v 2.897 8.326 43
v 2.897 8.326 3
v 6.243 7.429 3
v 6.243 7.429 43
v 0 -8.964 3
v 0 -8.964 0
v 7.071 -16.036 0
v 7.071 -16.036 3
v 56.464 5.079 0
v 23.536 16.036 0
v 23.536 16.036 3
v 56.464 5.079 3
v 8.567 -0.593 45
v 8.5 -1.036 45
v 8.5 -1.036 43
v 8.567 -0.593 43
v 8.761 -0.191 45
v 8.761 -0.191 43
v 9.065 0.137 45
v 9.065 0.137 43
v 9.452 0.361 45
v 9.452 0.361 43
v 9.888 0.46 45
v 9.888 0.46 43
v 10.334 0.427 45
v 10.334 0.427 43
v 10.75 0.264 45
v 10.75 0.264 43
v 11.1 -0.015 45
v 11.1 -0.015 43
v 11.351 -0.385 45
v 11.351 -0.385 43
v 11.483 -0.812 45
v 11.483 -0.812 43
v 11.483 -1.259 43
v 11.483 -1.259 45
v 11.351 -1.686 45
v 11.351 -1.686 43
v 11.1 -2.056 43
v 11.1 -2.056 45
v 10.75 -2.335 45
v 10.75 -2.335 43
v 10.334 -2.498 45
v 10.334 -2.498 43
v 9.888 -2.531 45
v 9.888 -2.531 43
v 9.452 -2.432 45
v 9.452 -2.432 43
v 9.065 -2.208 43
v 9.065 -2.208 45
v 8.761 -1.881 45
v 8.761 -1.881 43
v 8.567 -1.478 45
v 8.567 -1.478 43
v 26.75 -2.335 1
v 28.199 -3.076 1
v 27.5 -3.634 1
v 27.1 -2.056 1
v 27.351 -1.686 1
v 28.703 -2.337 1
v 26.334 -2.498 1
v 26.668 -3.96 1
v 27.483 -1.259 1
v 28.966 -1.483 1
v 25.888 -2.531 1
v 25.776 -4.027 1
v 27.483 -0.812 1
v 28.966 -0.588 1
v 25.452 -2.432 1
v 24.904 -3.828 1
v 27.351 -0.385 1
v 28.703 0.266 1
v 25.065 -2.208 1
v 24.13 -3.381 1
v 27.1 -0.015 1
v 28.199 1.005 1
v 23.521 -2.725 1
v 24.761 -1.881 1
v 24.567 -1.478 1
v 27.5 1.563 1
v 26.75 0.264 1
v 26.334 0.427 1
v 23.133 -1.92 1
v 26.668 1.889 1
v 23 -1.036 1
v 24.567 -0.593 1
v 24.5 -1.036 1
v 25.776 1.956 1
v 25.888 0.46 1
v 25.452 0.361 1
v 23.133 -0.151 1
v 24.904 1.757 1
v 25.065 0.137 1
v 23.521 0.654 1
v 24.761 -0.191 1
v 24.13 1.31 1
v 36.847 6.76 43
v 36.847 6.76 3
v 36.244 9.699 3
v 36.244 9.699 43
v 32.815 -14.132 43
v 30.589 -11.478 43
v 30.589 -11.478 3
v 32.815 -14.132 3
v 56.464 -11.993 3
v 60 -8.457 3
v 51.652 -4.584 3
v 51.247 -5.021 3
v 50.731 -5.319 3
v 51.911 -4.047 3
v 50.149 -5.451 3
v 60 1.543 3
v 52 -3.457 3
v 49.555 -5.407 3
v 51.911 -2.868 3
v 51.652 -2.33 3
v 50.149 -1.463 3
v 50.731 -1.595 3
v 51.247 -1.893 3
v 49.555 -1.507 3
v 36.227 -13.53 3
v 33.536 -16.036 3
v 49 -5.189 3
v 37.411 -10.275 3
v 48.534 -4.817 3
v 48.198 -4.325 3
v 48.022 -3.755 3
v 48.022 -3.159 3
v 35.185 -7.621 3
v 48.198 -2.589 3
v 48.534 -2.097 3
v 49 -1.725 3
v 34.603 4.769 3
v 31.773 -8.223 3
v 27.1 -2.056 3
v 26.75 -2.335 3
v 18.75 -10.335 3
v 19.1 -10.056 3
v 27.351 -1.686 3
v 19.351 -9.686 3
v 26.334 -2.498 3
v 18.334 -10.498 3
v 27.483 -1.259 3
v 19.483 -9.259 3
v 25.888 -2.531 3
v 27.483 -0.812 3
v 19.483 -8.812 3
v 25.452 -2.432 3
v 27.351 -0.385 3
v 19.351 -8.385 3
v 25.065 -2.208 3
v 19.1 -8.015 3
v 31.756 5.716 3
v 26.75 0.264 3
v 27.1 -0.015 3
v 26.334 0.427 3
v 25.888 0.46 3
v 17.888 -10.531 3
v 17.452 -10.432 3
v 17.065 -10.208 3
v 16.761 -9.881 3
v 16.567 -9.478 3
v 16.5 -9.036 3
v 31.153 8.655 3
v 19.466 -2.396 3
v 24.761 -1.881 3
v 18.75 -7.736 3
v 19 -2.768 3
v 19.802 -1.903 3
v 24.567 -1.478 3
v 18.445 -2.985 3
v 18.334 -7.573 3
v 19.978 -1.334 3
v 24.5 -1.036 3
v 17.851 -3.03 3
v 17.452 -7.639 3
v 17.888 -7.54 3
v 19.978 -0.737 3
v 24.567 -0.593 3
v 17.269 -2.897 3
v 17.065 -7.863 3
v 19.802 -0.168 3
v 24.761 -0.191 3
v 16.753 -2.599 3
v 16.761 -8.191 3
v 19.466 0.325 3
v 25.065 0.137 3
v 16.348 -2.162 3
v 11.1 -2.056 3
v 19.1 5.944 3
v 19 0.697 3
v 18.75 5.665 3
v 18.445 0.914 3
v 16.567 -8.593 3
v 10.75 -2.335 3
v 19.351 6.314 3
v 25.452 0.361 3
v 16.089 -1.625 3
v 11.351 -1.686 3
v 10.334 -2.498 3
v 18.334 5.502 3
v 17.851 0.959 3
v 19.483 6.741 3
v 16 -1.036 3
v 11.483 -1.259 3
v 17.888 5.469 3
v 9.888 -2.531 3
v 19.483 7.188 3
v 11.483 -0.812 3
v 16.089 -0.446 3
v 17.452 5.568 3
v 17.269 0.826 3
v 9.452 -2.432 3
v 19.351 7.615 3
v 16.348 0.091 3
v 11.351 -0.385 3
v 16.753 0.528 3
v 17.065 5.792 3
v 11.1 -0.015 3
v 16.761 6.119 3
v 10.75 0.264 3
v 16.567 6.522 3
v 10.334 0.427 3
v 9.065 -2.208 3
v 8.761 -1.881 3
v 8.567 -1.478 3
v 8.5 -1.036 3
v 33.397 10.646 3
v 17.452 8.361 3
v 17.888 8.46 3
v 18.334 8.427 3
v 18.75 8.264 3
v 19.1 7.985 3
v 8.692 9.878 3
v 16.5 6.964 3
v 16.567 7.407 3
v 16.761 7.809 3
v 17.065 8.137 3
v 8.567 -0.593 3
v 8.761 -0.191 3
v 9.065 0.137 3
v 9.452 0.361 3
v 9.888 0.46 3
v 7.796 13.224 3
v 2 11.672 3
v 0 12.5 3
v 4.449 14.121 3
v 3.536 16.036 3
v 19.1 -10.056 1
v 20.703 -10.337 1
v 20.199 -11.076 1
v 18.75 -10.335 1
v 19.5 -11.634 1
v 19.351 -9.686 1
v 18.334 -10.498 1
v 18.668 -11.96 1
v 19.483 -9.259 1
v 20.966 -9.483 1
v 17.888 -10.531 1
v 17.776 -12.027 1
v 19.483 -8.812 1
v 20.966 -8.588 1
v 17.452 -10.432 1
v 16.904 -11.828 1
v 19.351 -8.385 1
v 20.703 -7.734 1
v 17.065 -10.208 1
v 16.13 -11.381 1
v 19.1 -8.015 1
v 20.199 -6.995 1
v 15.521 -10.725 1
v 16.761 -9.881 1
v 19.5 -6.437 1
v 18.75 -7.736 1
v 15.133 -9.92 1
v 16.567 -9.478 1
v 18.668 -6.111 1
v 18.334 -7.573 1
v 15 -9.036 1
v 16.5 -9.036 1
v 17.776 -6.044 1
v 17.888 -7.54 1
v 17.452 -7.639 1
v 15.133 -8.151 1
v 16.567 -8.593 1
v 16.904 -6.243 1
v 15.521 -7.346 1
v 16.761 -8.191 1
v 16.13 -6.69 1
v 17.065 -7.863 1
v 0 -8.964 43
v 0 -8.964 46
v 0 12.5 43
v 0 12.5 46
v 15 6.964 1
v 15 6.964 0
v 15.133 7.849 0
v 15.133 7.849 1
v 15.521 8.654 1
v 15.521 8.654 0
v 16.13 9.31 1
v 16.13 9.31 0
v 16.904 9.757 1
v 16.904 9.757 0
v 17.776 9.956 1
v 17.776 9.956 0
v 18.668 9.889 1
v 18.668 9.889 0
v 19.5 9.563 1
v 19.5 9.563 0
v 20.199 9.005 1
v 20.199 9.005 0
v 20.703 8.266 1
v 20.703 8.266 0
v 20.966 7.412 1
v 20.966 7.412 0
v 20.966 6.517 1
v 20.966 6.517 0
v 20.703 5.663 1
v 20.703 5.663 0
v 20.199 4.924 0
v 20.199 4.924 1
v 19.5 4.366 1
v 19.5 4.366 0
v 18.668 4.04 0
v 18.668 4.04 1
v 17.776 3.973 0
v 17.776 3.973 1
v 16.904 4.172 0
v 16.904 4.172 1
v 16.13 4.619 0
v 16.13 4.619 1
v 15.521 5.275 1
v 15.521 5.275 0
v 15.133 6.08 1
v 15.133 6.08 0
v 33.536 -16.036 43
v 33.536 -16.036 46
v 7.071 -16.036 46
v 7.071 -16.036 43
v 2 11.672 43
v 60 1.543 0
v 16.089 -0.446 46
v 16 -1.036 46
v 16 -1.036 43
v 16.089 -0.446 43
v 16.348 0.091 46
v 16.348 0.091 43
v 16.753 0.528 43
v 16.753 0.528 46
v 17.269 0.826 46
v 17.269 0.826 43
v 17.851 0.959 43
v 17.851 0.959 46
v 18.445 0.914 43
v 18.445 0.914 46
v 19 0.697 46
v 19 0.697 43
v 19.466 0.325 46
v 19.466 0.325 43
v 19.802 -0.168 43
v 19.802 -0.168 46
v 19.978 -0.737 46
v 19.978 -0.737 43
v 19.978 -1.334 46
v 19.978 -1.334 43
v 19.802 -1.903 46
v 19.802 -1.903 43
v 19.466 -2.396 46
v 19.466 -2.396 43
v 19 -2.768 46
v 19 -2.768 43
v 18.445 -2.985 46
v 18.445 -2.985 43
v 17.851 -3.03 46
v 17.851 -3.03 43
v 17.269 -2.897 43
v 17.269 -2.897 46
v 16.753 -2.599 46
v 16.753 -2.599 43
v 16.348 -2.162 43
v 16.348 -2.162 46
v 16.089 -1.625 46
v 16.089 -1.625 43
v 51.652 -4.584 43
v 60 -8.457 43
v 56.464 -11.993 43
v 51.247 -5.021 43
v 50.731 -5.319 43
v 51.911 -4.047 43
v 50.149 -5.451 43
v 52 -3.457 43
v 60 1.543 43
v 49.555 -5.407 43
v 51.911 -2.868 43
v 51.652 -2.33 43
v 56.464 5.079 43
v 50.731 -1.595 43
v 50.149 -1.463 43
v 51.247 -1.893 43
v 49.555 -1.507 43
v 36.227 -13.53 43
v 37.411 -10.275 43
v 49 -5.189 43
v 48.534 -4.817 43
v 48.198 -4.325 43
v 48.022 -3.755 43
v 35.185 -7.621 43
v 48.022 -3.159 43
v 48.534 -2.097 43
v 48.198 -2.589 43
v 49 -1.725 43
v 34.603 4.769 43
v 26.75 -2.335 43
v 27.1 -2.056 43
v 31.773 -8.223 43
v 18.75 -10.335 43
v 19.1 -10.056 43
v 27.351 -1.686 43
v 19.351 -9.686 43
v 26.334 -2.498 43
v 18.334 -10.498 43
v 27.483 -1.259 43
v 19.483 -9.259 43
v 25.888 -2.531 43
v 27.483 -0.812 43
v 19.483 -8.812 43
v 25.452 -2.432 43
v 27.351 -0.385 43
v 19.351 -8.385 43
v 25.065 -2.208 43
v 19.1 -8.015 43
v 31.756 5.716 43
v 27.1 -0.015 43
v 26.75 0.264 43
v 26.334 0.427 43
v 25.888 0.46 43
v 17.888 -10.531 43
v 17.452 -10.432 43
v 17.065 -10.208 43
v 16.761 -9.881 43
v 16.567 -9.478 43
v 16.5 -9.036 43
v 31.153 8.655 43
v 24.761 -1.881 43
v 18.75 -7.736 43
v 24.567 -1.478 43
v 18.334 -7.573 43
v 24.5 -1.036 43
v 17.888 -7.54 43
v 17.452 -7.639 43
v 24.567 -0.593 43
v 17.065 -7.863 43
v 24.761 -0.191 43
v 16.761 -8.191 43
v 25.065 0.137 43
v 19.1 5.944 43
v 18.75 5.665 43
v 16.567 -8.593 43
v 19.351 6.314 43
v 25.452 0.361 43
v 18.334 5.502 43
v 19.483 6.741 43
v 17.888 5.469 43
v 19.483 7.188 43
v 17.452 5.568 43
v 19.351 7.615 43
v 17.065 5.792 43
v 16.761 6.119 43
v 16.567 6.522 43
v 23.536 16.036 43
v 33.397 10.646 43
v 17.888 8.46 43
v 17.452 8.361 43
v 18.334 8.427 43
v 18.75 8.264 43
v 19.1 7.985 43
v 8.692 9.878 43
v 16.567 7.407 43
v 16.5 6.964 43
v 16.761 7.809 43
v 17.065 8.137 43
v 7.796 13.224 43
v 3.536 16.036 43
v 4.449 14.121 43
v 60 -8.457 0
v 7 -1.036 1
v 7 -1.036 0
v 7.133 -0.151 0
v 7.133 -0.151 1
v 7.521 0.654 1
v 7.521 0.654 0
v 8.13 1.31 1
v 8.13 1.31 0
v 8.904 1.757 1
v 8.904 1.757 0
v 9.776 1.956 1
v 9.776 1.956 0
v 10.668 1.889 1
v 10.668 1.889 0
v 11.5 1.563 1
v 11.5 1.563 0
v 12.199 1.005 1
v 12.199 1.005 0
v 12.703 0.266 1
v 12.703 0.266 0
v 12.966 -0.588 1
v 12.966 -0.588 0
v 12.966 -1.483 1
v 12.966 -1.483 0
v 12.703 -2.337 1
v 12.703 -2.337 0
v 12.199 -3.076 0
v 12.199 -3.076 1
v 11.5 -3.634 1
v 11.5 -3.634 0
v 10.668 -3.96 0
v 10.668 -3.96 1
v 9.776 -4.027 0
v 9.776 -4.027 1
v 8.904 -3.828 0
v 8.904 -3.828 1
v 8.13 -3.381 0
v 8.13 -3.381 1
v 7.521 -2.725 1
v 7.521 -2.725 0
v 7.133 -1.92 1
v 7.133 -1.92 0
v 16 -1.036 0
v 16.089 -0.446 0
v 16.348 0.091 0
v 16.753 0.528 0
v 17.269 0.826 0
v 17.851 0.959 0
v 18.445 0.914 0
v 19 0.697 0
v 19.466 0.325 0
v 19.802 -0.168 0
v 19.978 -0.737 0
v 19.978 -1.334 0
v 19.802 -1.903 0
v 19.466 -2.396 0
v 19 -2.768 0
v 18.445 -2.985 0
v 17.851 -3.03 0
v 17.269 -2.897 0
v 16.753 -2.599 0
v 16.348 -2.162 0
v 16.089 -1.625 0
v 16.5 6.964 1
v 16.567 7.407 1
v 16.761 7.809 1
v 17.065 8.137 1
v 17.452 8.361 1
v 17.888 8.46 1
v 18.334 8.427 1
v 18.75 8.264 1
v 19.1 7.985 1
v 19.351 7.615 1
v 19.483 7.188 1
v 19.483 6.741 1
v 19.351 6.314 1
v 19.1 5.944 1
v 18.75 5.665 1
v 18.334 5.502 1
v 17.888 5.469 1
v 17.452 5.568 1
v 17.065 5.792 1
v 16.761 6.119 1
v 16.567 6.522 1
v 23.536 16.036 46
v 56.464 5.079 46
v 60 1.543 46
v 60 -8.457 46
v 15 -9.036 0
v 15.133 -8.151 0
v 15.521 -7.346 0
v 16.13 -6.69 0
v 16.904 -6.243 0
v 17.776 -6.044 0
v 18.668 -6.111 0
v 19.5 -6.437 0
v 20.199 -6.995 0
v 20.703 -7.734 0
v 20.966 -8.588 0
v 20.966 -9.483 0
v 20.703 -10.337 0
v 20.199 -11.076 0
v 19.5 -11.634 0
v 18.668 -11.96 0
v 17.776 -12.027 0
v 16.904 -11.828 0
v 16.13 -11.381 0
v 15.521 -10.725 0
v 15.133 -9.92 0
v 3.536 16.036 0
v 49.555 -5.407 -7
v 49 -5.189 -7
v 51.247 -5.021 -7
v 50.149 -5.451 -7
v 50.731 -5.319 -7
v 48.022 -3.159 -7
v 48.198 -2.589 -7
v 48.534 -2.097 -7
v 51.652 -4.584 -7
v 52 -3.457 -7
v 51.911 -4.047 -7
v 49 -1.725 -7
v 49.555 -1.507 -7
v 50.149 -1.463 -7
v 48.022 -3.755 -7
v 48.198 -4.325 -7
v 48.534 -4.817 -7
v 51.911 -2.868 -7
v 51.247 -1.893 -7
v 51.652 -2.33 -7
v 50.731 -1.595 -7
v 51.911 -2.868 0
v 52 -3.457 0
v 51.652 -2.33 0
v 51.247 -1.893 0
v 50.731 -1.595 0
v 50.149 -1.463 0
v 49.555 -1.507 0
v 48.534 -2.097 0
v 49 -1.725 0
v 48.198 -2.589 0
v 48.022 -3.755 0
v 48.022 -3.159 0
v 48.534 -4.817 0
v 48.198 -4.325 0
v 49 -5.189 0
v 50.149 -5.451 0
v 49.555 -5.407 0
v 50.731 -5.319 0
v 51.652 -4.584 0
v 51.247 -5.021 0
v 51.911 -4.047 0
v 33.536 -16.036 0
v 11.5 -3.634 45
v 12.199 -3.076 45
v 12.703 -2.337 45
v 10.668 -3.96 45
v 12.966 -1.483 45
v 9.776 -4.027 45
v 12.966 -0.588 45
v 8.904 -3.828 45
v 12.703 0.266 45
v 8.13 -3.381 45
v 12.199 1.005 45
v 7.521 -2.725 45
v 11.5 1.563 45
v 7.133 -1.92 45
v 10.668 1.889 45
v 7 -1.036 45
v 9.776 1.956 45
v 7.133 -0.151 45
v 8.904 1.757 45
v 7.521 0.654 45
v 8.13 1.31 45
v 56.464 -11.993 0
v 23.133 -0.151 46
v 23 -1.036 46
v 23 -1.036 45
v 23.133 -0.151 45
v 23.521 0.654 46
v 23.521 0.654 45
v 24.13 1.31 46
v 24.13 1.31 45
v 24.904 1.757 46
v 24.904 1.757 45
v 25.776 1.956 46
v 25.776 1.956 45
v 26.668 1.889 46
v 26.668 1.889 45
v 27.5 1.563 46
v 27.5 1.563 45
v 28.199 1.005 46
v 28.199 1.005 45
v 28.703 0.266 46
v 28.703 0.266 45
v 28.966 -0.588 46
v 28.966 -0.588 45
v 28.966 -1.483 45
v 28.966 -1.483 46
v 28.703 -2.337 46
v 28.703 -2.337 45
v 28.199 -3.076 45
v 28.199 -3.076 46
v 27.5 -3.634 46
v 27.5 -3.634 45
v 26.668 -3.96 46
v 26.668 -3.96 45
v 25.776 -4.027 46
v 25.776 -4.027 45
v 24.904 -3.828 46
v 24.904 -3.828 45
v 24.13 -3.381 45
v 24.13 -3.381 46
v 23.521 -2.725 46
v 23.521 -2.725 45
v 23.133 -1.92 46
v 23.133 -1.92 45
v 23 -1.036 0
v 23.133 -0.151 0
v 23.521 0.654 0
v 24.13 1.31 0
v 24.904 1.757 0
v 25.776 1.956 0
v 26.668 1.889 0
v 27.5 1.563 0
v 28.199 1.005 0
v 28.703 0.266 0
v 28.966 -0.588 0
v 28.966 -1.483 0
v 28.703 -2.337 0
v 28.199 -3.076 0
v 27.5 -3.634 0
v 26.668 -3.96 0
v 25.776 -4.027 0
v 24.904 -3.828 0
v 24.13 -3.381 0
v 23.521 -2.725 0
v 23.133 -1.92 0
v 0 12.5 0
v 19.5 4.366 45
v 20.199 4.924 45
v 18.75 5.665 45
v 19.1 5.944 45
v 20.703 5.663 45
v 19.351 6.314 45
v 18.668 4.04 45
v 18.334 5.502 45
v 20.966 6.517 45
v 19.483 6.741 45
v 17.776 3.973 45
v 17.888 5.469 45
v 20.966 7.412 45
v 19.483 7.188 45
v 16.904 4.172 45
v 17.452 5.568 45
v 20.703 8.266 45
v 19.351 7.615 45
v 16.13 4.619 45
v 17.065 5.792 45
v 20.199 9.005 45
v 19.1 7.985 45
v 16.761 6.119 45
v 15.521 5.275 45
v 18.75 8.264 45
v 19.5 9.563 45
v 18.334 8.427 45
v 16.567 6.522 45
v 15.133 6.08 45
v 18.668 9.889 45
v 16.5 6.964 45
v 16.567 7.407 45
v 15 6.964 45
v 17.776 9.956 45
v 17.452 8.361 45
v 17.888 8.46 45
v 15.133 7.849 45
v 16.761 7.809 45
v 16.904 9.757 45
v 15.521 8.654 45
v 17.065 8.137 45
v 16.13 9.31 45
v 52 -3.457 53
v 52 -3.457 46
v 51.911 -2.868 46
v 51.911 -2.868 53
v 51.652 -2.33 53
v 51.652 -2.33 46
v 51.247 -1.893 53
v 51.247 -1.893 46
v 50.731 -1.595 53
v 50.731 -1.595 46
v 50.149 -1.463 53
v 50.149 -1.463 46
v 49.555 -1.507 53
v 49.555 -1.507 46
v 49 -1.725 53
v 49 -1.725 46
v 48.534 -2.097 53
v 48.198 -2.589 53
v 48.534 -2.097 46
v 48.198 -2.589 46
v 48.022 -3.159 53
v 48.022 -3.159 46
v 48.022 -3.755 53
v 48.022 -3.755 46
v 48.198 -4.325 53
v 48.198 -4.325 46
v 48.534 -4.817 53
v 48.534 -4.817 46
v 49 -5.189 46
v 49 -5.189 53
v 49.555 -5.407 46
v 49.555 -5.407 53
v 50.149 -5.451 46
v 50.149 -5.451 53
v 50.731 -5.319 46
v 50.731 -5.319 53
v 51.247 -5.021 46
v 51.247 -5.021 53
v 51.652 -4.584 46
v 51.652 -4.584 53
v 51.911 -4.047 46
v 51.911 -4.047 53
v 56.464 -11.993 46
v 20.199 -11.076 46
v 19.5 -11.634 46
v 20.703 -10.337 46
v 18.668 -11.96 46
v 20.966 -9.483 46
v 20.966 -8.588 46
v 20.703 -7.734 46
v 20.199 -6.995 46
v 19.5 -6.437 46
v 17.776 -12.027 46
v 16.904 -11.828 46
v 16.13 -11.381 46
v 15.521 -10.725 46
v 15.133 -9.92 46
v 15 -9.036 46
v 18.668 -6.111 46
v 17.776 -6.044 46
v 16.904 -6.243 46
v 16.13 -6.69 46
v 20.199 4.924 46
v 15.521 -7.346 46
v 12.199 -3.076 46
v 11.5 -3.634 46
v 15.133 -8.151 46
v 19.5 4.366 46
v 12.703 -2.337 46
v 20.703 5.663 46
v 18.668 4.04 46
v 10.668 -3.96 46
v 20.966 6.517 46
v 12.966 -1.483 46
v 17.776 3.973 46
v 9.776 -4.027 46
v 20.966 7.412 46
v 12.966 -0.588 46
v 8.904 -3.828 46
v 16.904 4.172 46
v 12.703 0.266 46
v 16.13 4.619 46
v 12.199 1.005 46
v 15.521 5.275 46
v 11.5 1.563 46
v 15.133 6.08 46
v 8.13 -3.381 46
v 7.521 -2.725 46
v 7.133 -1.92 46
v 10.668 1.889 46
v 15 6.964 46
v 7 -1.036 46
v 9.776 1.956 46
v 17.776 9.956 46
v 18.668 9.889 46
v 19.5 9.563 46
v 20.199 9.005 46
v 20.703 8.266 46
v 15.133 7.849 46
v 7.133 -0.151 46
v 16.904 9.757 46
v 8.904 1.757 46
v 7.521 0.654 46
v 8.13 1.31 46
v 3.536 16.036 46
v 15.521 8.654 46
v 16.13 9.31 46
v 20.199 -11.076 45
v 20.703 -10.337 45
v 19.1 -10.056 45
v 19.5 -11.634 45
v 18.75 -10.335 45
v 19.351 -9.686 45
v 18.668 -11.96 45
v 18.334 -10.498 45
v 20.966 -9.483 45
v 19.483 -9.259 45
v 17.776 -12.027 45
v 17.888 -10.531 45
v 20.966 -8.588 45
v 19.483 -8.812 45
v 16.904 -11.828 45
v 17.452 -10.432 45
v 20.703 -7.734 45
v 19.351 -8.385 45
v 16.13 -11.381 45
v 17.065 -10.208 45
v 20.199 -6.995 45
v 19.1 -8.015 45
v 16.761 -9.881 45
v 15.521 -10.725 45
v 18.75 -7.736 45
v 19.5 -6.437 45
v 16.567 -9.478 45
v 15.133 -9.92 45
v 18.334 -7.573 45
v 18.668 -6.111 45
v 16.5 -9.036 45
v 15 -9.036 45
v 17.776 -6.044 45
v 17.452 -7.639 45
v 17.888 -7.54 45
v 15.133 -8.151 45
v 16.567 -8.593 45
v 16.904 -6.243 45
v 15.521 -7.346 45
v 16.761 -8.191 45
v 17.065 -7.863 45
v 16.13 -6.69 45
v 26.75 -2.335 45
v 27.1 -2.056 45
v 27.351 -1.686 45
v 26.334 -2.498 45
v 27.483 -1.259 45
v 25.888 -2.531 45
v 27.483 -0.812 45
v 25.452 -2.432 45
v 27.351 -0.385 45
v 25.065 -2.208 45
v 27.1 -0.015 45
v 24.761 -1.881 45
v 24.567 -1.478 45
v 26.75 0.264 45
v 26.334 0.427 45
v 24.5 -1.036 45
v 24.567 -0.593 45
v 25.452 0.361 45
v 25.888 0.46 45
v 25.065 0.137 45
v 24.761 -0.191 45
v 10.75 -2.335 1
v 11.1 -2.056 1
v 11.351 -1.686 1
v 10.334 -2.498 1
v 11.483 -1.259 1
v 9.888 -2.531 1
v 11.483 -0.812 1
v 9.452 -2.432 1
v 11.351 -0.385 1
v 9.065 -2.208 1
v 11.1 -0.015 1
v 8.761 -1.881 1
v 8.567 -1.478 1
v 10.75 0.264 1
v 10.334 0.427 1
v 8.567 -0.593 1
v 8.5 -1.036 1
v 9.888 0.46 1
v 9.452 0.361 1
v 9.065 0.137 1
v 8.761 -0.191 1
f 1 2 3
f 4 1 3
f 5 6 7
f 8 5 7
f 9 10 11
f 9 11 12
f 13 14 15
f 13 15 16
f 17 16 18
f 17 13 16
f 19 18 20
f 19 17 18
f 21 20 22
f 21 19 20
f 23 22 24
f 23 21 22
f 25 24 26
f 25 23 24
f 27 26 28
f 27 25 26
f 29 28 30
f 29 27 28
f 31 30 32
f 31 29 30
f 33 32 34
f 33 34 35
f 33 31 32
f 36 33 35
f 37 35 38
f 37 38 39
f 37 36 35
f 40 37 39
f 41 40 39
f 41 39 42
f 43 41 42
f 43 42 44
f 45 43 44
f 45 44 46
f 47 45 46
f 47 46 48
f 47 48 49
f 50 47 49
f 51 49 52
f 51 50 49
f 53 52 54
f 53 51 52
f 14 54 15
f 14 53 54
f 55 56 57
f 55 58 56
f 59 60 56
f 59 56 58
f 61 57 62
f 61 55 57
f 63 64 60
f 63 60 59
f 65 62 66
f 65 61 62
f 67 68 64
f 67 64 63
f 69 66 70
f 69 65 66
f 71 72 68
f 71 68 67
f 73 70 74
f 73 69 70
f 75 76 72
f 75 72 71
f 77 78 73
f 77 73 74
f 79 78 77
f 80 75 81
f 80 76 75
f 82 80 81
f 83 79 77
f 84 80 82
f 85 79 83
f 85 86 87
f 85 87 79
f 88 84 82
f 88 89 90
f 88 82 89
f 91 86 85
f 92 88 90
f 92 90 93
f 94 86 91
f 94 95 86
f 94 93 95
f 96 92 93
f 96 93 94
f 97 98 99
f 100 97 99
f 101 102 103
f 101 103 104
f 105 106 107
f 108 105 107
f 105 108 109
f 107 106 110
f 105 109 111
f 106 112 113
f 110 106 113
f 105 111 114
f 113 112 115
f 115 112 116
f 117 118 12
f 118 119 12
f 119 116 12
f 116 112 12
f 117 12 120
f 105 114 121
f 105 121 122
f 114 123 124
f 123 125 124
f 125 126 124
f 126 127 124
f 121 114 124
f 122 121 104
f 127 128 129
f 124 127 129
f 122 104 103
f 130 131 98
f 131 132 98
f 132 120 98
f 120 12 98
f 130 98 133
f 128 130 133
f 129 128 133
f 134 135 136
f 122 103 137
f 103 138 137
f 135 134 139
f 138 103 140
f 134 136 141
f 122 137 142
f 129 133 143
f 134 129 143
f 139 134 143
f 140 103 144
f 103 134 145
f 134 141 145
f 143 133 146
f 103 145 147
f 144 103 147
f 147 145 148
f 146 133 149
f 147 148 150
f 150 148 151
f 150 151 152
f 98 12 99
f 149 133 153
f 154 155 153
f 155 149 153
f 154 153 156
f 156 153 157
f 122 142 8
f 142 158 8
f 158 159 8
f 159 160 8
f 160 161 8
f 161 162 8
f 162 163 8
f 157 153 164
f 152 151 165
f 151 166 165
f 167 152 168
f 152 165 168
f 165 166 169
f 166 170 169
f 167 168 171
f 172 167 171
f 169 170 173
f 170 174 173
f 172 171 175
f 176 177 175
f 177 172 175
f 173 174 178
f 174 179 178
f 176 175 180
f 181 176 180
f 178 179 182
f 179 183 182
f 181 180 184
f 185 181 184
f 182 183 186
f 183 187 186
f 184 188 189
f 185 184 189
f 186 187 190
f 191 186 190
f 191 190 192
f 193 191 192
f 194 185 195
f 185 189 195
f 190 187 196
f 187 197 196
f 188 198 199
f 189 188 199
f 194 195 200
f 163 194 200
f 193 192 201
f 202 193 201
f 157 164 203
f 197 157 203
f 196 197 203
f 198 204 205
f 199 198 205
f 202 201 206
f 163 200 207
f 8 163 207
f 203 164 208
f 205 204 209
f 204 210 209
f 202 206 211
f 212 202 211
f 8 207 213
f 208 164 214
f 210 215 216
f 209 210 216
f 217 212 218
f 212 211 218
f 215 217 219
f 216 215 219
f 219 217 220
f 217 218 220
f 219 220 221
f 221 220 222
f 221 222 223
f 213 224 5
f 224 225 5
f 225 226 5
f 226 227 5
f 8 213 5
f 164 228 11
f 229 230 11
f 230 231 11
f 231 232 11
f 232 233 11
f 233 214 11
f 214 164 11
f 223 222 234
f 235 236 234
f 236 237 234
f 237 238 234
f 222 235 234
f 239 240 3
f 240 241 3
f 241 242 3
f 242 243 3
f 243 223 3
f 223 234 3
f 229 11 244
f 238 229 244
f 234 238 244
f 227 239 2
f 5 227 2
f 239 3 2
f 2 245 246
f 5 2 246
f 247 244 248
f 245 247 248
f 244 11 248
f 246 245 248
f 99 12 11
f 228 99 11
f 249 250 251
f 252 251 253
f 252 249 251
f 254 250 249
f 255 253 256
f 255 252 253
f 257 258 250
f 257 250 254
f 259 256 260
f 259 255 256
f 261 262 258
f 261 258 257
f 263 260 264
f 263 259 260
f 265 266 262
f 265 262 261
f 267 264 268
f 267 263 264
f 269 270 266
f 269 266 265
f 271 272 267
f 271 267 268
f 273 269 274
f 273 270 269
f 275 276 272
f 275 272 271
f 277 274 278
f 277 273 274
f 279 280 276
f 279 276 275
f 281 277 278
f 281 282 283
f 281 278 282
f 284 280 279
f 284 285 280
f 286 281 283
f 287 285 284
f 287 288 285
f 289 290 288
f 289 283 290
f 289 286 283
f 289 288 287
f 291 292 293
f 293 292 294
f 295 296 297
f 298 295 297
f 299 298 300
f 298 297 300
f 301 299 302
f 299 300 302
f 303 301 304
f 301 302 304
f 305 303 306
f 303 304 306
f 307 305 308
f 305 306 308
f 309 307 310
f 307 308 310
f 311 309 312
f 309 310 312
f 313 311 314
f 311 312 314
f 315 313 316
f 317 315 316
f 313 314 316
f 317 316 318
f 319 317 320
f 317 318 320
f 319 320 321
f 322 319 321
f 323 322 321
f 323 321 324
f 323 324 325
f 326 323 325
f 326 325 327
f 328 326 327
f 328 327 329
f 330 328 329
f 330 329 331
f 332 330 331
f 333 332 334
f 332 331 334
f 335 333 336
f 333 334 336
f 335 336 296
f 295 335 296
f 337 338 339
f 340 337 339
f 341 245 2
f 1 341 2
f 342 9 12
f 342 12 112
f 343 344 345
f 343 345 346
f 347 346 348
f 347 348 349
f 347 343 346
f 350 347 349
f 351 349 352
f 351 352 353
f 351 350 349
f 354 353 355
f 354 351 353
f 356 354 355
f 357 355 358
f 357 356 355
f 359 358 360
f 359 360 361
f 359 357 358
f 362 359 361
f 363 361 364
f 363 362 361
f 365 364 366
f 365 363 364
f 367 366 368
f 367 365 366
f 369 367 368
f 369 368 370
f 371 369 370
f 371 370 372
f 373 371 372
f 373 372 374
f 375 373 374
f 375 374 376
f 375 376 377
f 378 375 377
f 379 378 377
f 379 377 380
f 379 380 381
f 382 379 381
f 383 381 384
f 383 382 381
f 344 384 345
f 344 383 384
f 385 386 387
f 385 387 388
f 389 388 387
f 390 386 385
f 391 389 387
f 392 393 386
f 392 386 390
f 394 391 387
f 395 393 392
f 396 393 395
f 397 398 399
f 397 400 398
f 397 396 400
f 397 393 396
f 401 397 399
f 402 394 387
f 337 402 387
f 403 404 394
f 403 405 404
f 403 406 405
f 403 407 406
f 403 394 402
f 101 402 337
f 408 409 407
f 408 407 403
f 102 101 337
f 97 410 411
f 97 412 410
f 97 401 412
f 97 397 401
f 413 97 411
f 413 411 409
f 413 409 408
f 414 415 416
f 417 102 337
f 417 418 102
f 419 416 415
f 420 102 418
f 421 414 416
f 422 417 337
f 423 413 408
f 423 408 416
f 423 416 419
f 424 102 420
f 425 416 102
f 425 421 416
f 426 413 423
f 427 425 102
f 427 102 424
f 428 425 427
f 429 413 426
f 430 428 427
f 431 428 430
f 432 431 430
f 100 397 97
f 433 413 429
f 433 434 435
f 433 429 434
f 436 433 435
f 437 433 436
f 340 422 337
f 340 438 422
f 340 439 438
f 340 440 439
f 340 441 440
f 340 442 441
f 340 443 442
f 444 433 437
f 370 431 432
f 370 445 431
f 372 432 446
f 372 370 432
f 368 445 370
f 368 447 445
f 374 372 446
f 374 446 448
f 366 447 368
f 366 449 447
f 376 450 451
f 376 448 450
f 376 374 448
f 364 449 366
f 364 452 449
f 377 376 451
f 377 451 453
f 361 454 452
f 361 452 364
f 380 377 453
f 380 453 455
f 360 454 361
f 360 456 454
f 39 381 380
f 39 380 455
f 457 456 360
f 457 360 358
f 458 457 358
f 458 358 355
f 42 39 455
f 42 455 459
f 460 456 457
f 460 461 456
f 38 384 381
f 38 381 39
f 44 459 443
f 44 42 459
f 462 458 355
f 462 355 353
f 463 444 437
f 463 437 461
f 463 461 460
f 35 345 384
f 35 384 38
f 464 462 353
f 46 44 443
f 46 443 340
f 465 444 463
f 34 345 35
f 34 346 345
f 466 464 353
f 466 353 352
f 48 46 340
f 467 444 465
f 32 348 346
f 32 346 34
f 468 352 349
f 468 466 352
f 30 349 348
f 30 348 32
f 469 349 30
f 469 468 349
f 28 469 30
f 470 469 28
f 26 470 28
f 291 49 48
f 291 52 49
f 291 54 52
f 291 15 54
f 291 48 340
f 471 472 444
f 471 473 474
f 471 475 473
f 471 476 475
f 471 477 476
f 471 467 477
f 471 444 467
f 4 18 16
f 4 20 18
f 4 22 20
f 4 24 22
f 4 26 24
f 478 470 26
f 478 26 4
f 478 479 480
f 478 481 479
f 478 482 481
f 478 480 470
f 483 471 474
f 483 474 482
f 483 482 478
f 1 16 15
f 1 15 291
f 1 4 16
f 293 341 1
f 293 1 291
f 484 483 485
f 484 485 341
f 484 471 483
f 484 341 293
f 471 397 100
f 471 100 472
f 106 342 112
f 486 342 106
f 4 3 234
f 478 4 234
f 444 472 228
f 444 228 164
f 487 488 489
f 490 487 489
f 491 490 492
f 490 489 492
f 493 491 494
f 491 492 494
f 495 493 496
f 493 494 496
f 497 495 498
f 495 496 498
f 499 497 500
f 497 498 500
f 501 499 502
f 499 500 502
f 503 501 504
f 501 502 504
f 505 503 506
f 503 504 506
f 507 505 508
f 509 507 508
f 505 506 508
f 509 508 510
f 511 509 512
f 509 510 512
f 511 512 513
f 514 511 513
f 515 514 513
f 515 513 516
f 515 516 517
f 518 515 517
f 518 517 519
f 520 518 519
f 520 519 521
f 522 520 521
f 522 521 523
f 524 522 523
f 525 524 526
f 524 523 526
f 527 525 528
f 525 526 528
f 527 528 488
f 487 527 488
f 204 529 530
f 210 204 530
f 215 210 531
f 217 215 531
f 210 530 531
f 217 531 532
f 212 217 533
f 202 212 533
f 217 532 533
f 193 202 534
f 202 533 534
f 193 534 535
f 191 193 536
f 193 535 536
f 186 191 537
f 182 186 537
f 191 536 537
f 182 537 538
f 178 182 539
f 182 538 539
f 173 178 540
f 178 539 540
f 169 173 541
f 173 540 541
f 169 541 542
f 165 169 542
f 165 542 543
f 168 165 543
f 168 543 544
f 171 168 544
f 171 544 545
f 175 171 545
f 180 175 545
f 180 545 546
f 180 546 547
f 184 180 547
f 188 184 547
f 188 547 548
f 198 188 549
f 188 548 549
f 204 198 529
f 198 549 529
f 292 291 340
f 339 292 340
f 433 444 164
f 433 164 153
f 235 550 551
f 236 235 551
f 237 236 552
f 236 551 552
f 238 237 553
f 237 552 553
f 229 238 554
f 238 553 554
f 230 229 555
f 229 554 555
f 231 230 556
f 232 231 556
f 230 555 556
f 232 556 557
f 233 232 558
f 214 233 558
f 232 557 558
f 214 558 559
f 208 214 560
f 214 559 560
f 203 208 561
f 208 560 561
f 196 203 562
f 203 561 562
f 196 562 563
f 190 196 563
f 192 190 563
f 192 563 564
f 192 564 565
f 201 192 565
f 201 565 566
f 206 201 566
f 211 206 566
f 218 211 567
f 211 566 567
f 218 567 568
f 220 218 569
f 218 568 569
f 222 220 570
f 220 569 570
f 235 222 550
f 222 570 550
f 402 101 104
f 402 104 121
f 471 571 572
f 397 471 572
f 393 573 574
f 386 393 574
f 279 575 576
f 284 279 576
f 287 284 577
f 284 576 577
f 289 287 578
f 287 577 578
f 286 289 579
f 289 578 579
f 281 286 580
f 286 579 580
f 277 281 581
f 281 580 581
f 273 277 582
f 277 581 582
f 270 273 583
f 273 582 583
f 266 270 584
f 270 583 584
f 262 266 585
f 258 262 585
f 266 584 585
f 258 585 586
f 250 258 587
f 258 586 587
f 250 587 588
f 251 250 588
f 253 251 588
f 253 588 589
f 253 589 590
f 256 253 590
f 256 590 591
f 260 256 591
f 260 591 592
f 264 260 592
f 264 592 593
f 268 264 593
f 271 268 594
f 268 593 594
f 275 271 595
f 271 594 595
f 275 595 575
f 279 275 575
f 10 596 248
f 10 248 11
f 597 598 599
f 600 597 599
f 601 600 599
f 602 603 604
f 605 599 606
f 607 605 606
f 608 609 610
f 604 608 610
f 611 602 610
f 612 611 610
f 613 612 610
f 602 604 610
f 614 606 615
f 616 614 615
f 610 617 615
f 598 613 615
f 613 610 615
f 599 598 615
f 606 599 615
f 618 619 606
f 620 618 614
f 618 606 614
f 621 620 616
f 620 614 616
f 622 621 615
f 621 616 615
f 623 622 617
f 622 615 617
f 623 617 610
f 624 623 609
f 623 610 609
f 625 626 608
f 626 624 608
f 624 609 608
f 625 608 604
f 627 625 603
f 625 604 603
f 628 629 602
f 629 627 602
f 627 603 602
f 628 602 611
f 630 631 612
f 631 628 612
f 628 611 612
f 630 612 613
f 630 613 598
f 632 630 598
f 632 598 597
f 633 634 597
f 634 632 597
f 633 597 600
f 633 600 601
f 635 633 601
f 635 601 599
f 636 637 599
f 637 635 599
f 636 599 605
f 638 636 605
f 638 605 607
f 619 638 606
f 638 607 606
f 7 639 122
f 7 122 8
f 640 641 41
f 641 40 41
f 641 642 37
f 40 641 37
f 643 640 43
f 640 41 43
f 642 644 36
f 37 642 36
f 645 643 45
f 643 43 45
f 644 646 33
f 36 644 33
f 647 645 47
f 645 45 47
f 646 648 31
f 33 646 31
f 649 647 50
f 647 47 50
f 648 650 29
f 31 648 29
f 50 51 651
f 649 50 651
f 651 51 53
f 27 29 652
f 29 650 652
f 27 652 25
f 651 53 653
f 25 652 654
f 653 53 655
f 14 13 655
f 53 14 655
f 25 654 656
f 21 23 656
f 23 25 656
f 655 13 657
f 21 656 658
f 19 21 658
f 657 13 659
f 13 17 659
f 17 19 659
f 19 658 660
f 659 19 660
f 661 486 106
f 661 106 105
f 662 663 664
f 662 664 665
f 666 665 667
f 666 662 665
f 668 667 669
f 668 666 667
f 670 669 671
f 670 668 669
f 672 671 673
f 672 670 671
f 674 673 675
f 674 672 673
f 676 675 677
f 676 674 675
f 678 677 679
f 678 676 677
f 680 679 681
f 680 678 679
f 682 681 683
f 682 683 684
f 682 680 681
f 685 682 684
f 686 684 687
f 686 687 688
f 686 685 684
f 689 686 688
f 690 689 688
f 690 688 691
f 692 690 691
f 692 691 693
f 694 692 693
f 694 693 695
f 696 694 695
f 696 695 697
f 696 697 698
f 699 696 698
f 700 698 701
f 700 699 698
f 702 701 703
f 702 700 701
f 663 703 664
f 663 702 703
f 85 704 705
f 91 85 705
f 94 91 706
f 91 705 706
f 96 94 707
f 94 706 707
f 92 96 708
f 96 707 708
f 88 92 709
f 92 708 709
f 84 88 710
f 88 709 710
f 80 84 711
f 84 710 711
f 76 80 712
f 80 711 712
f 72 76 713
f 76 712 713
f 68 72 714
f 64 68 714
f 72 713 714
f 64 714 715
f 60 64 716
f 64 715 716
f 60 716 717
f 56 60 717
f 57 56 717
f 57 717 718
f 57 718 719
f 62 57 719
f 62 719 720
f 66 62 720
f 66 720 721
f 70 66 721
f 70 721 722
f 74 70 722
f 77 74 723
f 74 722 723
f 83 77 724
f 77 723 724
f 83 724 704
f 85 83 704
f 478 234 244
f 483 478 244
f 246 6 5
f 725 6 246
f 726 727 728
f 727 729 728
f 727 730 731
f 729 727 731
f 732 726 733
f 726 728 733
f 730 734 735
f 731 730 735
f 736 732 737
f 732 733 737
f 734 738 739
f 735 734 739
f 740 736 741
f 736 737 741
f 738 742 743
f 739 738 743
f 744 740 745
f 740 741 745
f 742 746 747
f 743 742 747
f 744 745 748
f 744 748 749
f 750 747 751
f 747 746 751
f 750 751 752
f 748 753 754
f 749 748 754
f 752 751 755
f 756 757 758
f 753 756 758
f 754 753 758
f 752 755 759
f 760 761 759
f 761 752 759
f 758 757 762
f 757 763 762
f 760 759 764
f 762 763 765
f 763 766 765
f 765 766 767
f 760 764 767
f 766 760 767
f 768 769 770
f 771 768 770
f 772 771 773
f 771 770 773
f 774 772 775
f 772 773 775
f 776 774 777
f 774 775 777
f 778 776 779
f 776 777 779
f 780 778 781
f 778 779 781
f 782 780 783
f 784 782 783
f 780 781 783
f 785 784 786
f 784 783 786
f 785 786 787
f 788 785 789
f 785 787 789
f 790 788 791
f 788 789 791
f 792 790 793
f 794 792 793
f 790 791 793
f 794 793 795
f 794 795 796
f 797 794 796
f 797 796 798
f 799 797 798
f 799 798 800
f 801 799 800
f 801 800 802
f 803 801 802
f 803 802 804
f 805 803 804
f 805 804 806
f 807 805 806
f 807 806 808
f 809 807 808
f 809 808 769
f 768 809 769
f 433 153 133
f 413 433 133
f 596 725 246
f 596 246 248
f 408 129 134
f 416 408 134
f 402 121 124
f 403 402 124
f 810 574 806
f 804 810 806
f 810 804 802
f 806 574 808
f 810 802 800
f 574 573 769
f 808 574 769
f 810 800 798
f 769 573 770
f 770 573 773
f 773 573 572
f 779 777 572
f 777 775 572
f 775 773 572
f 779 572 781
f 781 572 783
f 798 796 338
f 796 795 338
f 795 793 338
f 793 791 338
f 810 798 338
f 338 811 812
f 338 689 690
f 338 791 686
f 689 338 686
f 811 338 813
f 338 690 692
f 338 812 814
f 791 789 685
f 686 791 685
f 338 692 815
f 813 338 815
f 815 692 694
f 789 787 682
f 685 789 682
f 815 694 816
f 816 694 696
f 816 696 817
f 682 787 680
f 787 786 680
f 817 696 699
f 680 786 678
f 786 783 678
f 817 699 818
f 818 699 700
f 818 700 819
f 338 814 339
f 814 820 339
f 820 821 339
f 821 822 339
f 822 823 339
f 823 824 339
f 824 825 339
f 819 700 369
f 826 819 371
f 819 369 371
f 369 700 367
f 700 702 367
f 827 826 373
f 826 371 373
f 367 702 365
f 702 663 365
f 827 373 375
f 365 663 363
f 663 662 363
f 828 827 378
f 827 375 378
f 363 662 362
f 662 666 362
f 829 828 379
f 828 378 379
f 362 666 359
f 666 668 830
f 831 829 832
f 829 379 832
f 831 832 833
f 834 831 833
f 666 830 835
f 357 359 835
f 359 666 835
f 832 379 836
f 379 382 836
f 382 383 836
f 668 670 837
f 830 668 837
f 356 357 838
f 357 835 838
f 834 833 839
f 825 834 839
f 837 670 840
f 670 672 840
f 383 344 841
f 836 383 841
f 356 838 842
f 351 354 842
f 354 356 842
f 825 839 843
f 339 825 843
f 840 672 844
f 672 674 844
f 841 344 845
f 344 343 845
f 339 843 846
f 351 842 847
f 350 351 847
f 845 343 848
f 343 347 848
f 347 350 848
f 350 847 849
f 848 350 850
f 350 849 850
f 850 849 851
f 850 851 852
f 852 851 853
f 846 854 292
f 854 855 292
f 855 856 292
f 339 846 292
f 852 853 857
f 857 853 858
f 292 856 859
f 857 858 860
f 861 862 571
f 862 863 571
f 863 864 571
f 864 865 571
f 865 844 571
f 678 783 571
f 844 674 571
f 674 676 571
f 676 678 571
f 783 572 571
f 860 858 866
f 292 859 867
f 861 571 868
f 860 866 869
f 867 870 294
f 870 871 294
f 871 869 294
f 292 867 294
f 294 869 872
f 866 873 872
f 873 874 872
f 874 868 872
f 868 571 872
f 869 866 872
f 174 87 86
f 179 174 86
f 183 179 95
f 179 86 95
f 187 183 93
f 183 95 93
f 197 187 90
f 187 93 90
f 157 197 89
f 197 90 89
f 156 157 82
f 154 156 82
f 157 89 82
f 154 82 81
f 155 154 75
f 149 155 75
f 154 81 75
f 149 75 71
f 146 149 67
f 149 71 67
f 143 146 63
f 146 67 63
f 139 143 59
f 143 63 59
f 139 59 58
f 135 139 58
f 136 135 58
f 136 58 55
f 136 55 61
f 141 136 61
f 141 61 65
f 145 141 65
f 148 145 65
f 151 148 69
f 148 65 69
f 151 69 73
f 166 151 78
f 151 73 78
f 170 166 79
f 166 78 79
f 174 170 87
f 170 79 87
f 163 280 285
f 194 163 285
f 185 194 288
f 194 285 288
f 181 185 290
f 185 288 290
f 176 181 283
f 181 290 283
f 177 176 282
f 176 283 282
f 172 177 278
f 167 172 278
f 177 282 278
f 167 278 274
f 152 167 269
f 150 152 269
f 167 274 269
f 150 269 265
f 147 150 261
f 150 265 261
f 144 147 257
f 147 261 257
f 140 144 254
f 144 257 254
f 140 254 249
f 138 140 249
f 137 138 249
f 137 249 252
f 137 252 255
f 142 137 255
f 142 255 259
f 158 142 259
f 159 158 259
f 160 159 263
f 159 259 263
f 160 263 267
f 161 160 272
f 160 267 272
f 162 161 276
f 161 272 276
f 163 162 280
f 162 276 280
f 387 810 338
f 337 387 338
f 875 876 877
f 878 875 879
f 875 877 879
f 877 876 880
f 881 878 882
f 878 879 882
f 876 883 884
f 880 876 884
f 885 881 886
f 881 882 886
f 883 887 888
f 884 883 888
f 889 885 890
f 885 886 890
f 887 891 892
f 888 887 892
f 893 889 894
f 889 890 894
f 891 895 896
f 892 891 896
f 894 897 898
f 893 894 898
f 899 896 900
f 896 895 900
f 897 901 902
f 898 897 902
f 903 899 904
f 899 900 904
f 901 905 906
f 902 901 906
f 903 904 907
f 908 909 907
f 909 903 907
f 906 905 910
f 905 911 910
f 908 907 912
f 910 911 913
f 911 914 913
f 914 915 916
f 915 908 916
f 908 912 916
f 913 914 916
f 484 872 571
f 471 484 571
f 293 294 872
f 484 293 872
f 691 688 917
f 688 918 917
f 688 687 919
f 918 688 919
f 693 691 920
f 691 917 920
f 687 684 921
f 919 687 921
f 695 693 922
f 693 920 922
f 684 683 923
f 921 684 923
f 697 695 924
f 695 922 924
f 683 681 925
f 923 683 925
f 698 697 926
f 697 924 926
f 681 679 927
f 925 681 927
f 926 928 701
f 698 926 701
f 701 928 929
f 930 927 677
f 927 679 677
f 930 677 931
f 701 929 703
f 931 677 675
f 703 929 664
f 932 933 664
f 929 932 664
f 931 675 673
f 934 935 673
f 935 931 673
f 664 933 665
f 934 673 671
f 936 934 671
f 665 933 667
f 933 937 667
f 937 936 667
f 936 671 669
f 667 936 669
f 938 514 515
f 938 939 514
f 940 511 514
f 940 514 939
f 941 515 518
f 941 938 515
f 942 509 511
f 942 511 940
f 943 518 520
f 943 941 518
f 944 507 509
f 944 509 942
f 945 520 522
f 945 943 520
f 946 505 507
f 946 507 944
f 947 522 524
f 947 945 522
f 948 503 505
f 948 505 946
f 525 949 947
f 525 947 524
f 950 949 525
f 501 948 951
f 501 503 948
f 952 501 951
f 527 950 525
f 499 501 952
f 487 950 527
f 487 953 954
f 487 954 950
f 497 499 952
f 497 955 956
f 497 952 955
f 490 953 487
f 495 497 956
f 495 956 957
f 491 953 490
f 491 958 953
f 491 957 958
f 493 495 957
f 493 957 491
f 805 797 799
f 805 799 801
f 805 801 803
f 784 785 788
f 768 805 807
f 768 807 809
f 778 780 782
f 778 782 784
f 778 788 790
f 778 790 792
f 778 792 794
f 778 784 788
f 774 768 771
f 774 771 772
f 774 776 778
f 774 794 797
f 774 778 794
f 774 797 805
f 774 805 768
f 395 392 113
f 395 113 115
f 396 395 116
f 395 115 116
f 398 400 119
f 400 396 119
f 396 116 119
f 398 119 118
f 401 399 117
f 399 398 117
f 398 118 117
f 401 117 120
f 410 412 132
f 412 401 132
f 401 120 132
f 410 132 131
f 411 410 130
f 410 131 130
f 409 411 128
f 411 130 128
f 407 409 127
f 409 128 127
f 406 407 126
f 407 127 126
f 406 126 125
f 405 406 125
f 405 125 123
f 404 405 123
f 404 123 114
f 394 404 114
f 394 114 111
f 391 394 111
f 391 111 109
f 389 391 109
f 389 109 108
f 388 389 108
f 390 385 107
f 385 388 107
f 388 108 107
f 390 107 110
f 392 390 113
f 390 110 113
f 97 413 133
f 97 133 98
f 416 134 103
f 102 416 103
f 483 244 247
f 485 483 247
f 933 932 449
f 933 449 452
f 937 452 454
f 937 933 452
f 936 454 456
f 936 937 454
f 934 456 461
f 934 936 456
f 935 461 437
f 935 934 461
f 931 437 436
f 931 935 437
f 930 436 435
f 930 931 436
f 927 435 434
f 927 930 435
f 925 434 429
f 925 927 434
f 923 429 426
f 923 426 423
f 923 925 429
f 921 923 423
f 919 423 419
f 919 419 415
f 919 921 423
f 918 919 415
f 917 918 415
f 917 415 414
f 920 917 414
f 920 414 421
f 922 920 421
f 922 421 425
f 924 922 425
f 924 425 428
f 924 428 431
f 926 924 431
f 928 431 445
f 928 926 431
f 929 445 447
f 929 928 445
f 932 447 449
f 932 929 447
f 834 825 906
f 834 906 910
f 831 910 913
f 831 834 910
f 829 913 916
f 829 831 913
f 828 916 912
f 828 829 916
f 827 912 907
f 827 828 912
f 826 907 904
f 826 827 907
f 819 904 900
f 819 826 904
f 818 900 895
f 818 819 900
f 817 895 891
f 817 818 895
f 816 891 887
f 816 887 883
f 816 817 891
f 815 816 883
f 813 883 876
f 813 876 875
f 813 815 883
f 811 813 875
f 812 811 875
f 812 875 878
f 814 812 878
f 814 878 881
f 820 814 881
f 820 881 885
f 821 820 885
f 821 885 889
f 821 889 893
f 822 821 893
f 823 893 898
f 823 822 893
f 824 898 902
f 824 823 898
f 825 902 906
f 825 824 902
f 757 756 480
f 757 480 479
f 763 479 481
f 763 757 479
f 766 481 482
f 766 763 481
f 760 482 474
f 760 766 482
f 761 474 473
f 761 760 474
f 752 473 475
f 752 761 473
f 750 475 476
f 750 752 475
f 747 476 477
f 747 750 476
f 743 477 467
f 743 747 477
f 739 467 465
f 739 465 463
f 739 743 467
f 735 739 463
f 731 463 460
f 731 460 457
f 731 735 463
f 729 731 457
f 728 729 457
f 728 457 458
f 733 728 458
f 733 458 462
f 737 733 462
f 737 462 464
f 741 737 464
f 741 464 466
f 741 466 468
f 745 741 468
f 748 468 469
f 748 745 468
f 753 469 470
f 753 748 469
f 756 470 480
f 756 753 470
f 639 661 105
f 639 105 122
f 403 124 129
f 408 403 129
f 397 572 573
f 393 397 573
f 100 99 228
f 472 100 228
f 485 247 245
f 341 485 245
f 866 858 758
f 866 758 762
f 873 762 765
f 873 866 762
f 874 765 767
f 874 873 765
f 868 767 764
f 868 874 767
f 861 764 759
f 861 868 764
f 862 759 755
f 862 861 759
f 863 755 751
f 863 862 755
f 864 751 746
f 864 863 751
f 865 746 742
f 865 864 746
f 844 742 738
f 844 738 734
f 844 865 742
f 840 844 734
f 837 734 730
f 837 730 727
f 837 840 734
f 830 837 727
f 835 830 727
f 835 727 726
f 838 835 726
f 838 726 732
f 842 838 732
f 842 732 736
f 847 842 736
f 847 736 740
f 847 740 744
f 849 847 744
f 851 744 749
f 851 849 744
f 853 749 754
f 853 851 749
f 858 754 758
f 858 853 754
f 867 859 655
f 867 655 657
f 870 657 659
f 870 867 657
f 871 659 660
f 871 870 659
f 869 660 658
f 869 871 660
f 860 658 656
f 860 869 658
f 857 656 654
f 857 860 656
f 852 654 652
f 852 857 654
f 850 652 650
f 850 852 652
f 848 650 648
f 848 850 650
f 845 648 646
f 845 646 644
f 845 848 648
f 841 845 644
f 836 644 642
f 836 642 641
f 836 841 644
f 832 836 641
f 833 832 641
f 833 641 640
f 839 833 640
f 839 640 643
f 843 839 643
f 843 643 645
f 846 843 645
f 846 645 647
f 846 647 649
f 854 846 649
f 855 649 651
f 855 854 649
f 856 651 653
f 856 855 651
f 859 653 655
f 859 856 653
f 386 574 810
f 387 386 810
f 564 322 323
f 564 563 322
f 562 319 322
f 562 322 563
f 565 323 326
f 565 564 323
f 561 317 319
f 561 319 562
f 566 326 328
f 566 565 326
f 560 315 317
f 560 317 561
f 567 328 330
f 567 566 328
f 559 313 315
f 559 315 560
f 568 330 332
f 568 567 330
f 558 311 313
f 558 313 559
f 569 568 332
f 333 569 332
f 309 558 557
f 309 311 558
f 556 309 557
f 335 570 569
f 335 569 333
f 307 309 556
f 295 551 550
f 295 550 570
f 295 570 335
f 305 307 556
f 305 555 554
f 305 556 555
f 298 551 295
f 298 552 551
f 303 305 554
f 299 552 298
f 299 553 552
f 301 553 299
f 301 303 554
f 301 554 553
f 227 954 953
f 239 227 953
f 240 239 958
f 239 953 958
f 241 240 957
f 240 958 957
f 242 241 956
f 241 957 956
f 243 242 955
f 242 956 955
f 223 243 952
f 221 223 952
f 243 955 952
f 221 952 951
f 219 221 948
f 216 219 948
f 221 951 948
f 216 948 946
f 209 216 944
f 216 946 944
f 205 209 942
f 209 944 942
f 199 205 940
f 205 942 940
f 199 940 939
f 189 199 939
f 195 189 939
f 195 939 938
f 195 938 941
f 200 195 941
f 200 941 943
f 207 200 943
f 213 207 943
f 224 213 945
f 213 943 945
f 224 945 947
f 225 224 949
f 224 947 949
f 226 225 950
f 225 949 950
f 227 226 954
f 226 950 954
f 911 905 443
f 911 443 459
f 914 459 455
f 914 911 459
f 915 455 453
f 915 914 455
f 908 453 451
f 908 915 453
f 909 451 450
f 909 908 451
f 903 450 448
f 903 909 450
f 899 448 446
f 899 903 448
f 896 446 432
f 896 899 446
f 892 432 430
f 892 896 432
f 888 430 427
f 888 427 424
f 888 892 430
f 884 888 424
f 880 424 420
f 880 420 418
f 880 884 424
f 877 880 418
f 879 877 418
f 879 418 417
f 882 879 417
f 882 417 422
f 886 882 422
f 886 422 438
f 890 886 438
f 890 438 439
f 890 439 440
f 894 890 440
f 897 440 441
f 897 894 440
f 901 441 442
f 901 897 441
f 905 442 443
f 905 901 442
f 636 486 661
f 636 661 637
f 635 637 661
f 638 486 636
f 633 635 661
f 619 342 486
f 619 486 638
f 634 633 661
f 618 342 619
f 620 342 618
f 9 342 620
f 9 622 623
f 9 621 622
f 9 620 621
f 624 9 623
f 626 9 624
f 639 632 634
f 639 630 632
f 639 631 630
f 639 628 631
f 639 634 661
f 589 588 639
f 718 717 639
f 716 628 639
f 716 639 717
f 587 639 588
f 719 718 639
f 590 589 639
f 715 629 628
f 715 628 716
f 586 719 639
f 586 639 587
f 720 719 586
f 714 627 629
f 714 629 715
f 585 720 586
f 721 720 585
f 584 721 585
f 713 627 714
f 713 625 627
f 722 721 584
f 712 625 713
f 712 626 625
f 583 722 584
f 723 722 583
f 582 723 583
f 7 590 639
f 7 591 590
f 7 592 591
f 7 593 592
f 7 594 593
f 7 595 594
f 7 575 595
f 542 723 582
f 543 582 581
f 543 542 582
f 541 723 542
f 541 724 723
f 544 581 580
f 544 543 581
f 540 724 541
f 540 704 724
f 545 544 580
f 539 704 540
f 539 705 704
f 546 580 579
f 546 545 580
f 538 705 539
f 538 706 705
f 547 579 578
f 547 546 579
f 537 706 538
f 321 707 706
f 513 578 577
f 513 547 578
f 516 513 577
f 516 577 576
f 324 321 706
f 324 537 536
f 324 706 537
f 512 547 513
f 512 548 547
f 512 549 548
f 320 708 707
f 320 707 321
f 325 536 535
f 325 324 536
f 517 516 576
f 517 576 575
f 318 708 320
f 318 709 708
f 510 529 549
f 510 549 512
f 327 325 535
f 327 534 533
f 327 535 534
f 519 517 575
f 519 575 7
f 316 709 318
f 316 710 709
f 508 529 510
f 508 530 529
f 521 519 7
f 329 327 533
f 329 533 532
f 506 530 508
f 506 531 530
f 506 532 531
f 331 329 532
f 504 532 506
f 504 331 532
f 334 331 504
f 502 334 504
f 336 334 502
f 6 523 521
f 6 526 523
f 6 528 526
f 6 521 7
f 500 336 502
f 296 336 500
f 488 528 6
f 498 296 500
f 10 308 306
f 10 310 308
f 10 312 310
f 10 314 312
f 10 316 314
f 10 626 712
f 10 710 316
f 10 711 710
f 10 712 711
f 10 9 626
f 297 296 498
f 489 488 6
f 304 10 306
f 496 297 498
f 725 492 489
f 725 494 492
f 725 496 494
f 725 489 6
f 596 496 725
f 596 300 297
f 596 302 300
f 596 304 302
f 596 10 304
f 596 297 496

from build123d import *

# Parameters (mm, degrees)
BOSS_EXTRUDE1_DEPTH      = 3
SKETCH4_R                = 2
CUT_EXTRUDE1_DEPTH       = 3
SKETCH5_R                = 3
CUT_EXTRUDE2_DEPTH       = 1
SKETCH6_R                = 1.5
CUT_EXTRUDE3_DEPTH       = 2
BOSS_EXTRUDE2_DEPTH      = 40
BOSS_EXTRUDE3_DEPTH      = 30
BOSS_EXTRUDE3_DEPTH_BACK = 30
SKETCH7_R                = 2
CUT_EXTRUDE5_REACH       = 83.646


with BuildPart() as part:
    # Sketch2 → Boss-Extrude1 (new body)
    with BuildSketch(Plane.XY):
        Polygon((33.535533906, -16.035533906), (3.535533906, -16.035533906), (0, -12.5), (0, 12.5), (3.535533906, 16.035533906), (23.535533906, 16.035533906), (56.464466094, 5.07852329), (60, 1.542989384), (60, -8.457010616), (56.464466094, -11.992544522), align=None)
    boss_extrude1 = extrude(amount=BOSS_EXTRUDE1_DEPTH)

    # Sketch4 → Cut-Extrude1 (cut)
    with BuildSketch(Plane(origin=(0, 0, 0), x_dir=(-1, 0, 0), z_dir=(0, 0, -1))):
        with Locations((-18, -1.035533906)):
            Circle(SKETCH4_R)
    cut_extrude1 = extrude(amount=-CUT_EXTRUDE1_DEPTH, mode=Mode.SUBTRACT)

    # Sketch5 → Cut-Extrude2 (cut)
    with BuildSketch(Plane(origin=(0, 0, 0), x_dir=(-1, 0, 0), z_dir=(0, 0, -1))):
        with Locations((-18, 6.964466094)):
            Circle(SKETCH5_R)
        with Locations((-10, -1.035533906)):
            Circle(SKETCH5_R)
        with Locations((-18, -9.035533906)):
            Circle(SKETCH5_R)
        with Locations((-26, -1.035533906)):
            Circle(SKETCH5_R)
    cut_extrude2 = extrude(amount=-CUT_EXTRUDE2_DEPTH, mode=Mode.SUBTRACT)

    # Sketch6 → Cut-Extrude3 (cut)
    with BuildSketch(Plane(origin=(0, 0, 1), x_dir=(-1, 0, 0), z_dir=(0, 0, -1))):
        with Locations((-18, 6.964466094)):
            Circle(SKETCH6_R)
        with Locations((-26, -1.035533906)):
            Circle(SKETCH6_R)
        with Locations((-10, -1.035533906)):
            Circle(SKETCH6_R)
        with Locations((-18, -9.035533906)):
            Circle(SKETCH6_R)
    cut_extrude3 = extrude(amount=-CUT_EXTRUDE3_DEPTH, mode=Mode.SUBTRACT)

    # Sketch3 → Boss-Extrude2 (add)
    with BuildSketch(Plane.XY.offset(3)):
        Polygon((8.69213043, 9.878421931), (7.795554958, 13.224487146), (4.449489743, 14.121062618), (2, 11.671572875), (2.896575472, 8.32550766), (6.242640687, 7.428932188), align=None)
        Polygon((36.226681597, -13.530158735), (37.411474128, -10.27496801), (35.184792531, -7.621312217), (31.773318403, -8.22284715), (30.588525872, -11.478037875), (32.815207469, -14.131693668), align=None)
        Polygon((36.846550019, 6.760383974), (36.24355834, 9.699159405), (33.397008321, 10.646341008), (31.153449981, 8.65474718), (31.75644166, 5.715971749), (34.602991679, 4.768790146), align=None)
    extrude(amount=BOSS_EXTRUDE2_DEPTH)

    # Mirror1: Boss-Extrude1, Cut-Extrude1, Cut-Extrude2, Cut-Extrude3 across plane
    add(boss_extrude1.mirror(Plane.XY.offset(23)))
    add(cut_extrude1.mirror(Plane.XY.offset(23)), mode=Mode.SUBTRACT)
    add(cut_extrude2.mirror(Plane.XY.offset(23)), mode=Mode.SUBTRACT)
    add(cut_extrude3.mirror(Plane.XY.offset(23)), mode=Mode.SUBTRACT)

    # Sketch7 → Boss-Extrude3 (add, two sides: drawn at the far end of the back side and taken through both)
    with BuildSketch(Plane.XY.offset(23).offset(-BOSS_EXTRUDE3_DEPTH_BACK)):
        with Locations((50, -3.457010616)):
            Circle(SKETCH7_R)
    extrude(amount=BOSS_EXTRUDE3_DEPTH + BOSS_EXTRUDE3_DEPTH_BACK)

    # Cut-Extrude5: up to this face of the body (flat: up to its plane)
    cut_extrude5_end = Plane(part.part.faces().sort_by_distance((18.535533906, -15.35519918, 46))[0])
    # Sketch9 → Cut-Extrude5 (cut, up to the picked face)
    with BuildSketch(Plane(origin=(0, 0, 0), x_dir=(-1, 0, 0), z_dir=(0, 0, -1)), mode=Mode.PRIVATE) as cut_extrude5_sk1:
        Polygon((0, -8.964466094), (-7.071067812, -16.035533906), (0, -16.035533906), align=None)
    cut_extrude5_tool1 = split(extrude(cut_extrude5_sk1.sketch, amount=-CUT_EXTRUDE5_REACH, mode=Mode.PRIVATE), bisect_by=cut_extrude5_end, keep=Keep.BOTH, mode=Mode.PRIVATE)
    add(cut_extrude5_tool1.solids().sort_by(Axis((2.357023, -13.678511, 0), (0, 0, 1)))[0], mode=Mode.SUBTRACT)


solid = part.part
